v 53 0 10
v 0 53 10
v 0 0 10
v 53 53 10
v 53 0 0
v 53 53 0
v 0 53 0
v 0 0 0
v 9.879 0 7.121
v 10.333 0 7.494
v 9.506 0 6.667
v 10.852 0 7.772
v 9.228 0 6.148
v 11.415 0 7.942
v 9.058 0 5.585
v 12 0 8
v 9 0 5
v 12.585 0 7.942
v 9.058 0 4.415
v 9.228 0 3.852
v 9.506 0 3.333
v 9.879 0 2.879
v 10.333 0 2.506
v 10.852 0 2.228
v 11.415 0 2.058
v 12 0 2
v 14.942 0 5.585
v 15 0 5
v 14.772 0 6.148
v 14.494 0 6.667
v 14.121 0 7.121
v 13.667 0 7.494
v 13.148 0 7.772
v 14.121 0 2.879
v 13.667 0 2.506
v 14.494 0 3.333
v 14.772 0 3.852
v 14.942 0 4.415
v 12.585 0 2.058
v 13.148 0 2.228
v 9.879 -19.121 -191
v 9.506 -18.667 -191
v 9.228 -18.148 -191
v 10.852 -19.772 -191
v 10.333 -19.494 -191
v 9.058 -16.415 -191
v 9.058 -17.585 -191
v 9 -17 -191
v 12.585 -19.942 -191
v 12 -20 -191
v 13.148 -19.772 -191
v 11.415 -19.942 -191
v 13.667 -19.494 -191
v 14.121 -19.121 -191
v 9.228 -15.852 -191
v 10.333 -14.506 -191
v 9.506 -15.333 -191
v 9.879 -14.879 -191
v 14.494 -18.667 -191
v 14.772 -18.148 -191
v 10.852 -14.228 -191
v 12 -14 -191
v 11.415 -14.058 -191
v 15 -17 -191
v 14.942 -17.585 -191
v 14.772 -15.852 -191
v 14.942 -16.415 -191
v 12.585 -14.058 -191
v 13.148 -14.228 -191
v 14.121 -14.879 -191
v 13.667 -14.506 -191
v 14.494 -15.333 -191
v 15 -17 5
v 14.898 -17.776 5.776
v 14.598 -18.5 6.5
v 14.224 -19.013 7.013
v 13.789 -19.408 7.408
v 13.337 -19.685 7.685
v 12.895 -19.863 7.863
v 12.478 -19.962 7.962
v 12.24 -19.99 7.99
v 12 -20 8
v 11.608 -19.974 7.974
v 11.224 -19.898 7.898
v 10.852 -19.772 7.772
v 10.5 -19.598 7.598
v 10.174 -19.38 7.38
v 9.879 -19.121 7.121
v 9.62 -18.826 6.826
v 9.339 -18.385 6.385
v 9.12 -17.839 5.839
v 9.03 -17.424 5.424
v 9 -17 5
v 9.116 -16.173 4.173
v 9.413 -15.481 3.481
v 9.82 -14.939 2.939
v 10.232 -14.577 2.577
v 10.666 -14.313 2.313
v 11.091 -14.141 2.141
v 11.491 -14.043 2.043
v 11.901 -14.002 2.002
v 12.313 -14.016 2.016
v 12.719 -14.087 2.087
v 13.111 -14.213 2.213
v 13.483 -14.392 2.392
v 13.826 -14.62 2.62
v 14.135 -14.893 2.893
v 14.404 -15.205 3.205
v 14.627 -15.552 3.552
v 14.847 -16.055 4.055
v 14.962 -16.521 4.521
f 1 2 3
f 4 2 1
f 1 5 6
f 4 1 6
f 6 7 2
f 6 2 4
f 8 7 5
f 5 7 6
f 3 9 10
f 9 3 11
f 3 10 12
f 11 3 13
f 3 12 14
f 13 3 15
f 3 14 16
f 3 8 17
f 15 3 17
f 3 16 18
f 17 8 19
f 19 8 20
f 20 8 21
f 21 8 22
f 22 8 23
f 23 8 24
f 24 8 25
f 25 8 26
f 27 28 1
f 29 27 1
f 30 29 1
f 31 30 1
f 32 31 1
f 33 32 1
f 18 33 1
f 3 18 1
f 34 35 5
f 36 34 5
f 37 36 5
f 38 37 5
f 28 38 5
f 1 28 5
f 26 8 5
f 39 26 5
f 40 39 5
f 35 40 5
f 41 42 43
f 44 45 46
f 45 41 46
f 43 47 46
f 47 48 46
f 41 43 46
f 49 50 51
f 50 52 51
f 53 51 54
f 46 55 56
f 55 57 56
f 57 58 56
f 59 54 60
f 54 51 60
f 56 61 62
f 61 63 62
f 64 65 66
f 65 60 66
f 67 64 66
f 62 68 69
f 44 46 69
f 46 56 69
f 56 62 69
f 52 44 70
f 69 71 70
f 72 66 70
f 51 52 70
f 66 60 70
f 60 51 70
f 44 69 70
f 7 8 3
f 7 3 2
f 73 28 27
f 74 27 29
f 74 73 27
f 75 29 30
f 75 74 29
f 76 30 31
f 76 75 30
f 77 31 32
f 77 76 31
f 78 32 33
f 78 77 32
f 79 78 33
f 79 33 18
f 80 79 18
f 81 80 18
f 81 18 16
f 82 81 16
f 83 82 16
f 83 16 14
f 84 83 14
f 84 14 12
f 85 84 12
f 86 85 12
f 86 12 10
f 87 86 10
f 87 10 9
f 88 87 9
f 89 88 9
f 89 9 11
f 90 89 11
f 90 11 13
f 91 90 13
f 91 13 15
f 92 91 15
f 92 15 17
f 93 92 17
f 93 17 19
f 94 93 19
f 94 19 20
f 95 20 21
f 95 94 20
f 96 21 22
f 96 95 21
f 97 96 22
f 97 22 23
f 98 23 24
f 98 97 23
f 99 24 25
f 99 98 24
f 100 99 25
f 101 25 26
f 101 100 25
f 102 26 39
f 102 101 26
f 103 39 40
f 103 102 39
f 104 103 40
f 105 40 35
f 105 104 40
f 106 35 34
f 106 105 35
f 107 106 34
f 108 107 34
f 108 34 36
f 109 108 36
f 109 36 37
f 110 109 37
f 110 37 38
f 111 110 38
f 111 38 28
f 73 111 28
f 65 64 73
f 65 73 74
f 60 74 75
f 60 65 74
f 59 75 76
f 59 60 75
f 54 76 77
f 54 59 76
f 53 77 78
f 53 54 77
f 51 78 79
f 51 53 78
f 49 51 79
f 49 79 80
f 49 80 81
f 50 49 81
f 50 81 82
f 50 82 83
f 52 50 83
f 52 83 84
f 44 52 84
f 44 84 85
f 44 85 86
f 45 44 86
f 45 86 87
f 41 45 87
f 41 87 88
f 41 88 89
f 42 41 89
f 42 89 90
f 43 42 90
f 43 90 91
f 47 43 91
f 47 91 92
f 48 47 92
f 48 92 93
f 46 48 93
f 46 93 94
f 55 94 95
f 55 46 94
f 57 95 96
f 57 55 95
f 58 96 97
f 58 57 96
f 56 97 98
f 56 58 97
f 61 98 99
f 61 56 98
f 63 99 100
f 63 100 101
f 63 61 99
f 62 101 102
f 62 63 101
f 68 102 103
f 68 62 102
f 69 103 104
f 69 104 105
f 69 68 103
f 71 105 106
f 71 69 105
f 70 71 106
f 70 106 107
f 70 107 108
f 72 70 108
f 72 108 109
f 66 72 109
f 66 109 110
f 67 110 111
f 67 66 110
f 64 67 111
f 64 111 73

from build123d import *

# Parameters (mm, degrees)
SKETCH_1_W      = 53
SKETCH_1_H      = 53
EXTRUDE_1_DEPTH = 10
SKETCH_2_R      = 3


with BuildPart() as part:
    # 草图1 → 凸台-拉伸1 (new body)
    with BuildSketch(Plane.XY):
        with Locations((26.5, 26.5)):
            Rectangle(SKETCH_1_W, SKETCH_1_H)
    extrude(amount=EXTRUDE_1_DEPTH)

    # 扫描1: sweep along a path in 草图4
    with BuildLine(Plane(origin=(0, 0, 0), x_dir=(0, 0, -1), z_dir=(1, 0, 0))) as sweep_1_path:
        Line((-5, 0), (-5, -17))
        Line((-5, -17), (191, -17))
    # 草图2 → 扫描1 (sweep)
    with BuildSketch(Plane(origin=(0, 0, 0), x_dir=(1, 0, 0), z_dir=(0, 1, 0))):
        with Locations((12, -5)):
            Circle(SKETCH_2_R)
    sweep(path=sweep_1_path.line, transition=Transition.RIGHT)


solid = part.part
